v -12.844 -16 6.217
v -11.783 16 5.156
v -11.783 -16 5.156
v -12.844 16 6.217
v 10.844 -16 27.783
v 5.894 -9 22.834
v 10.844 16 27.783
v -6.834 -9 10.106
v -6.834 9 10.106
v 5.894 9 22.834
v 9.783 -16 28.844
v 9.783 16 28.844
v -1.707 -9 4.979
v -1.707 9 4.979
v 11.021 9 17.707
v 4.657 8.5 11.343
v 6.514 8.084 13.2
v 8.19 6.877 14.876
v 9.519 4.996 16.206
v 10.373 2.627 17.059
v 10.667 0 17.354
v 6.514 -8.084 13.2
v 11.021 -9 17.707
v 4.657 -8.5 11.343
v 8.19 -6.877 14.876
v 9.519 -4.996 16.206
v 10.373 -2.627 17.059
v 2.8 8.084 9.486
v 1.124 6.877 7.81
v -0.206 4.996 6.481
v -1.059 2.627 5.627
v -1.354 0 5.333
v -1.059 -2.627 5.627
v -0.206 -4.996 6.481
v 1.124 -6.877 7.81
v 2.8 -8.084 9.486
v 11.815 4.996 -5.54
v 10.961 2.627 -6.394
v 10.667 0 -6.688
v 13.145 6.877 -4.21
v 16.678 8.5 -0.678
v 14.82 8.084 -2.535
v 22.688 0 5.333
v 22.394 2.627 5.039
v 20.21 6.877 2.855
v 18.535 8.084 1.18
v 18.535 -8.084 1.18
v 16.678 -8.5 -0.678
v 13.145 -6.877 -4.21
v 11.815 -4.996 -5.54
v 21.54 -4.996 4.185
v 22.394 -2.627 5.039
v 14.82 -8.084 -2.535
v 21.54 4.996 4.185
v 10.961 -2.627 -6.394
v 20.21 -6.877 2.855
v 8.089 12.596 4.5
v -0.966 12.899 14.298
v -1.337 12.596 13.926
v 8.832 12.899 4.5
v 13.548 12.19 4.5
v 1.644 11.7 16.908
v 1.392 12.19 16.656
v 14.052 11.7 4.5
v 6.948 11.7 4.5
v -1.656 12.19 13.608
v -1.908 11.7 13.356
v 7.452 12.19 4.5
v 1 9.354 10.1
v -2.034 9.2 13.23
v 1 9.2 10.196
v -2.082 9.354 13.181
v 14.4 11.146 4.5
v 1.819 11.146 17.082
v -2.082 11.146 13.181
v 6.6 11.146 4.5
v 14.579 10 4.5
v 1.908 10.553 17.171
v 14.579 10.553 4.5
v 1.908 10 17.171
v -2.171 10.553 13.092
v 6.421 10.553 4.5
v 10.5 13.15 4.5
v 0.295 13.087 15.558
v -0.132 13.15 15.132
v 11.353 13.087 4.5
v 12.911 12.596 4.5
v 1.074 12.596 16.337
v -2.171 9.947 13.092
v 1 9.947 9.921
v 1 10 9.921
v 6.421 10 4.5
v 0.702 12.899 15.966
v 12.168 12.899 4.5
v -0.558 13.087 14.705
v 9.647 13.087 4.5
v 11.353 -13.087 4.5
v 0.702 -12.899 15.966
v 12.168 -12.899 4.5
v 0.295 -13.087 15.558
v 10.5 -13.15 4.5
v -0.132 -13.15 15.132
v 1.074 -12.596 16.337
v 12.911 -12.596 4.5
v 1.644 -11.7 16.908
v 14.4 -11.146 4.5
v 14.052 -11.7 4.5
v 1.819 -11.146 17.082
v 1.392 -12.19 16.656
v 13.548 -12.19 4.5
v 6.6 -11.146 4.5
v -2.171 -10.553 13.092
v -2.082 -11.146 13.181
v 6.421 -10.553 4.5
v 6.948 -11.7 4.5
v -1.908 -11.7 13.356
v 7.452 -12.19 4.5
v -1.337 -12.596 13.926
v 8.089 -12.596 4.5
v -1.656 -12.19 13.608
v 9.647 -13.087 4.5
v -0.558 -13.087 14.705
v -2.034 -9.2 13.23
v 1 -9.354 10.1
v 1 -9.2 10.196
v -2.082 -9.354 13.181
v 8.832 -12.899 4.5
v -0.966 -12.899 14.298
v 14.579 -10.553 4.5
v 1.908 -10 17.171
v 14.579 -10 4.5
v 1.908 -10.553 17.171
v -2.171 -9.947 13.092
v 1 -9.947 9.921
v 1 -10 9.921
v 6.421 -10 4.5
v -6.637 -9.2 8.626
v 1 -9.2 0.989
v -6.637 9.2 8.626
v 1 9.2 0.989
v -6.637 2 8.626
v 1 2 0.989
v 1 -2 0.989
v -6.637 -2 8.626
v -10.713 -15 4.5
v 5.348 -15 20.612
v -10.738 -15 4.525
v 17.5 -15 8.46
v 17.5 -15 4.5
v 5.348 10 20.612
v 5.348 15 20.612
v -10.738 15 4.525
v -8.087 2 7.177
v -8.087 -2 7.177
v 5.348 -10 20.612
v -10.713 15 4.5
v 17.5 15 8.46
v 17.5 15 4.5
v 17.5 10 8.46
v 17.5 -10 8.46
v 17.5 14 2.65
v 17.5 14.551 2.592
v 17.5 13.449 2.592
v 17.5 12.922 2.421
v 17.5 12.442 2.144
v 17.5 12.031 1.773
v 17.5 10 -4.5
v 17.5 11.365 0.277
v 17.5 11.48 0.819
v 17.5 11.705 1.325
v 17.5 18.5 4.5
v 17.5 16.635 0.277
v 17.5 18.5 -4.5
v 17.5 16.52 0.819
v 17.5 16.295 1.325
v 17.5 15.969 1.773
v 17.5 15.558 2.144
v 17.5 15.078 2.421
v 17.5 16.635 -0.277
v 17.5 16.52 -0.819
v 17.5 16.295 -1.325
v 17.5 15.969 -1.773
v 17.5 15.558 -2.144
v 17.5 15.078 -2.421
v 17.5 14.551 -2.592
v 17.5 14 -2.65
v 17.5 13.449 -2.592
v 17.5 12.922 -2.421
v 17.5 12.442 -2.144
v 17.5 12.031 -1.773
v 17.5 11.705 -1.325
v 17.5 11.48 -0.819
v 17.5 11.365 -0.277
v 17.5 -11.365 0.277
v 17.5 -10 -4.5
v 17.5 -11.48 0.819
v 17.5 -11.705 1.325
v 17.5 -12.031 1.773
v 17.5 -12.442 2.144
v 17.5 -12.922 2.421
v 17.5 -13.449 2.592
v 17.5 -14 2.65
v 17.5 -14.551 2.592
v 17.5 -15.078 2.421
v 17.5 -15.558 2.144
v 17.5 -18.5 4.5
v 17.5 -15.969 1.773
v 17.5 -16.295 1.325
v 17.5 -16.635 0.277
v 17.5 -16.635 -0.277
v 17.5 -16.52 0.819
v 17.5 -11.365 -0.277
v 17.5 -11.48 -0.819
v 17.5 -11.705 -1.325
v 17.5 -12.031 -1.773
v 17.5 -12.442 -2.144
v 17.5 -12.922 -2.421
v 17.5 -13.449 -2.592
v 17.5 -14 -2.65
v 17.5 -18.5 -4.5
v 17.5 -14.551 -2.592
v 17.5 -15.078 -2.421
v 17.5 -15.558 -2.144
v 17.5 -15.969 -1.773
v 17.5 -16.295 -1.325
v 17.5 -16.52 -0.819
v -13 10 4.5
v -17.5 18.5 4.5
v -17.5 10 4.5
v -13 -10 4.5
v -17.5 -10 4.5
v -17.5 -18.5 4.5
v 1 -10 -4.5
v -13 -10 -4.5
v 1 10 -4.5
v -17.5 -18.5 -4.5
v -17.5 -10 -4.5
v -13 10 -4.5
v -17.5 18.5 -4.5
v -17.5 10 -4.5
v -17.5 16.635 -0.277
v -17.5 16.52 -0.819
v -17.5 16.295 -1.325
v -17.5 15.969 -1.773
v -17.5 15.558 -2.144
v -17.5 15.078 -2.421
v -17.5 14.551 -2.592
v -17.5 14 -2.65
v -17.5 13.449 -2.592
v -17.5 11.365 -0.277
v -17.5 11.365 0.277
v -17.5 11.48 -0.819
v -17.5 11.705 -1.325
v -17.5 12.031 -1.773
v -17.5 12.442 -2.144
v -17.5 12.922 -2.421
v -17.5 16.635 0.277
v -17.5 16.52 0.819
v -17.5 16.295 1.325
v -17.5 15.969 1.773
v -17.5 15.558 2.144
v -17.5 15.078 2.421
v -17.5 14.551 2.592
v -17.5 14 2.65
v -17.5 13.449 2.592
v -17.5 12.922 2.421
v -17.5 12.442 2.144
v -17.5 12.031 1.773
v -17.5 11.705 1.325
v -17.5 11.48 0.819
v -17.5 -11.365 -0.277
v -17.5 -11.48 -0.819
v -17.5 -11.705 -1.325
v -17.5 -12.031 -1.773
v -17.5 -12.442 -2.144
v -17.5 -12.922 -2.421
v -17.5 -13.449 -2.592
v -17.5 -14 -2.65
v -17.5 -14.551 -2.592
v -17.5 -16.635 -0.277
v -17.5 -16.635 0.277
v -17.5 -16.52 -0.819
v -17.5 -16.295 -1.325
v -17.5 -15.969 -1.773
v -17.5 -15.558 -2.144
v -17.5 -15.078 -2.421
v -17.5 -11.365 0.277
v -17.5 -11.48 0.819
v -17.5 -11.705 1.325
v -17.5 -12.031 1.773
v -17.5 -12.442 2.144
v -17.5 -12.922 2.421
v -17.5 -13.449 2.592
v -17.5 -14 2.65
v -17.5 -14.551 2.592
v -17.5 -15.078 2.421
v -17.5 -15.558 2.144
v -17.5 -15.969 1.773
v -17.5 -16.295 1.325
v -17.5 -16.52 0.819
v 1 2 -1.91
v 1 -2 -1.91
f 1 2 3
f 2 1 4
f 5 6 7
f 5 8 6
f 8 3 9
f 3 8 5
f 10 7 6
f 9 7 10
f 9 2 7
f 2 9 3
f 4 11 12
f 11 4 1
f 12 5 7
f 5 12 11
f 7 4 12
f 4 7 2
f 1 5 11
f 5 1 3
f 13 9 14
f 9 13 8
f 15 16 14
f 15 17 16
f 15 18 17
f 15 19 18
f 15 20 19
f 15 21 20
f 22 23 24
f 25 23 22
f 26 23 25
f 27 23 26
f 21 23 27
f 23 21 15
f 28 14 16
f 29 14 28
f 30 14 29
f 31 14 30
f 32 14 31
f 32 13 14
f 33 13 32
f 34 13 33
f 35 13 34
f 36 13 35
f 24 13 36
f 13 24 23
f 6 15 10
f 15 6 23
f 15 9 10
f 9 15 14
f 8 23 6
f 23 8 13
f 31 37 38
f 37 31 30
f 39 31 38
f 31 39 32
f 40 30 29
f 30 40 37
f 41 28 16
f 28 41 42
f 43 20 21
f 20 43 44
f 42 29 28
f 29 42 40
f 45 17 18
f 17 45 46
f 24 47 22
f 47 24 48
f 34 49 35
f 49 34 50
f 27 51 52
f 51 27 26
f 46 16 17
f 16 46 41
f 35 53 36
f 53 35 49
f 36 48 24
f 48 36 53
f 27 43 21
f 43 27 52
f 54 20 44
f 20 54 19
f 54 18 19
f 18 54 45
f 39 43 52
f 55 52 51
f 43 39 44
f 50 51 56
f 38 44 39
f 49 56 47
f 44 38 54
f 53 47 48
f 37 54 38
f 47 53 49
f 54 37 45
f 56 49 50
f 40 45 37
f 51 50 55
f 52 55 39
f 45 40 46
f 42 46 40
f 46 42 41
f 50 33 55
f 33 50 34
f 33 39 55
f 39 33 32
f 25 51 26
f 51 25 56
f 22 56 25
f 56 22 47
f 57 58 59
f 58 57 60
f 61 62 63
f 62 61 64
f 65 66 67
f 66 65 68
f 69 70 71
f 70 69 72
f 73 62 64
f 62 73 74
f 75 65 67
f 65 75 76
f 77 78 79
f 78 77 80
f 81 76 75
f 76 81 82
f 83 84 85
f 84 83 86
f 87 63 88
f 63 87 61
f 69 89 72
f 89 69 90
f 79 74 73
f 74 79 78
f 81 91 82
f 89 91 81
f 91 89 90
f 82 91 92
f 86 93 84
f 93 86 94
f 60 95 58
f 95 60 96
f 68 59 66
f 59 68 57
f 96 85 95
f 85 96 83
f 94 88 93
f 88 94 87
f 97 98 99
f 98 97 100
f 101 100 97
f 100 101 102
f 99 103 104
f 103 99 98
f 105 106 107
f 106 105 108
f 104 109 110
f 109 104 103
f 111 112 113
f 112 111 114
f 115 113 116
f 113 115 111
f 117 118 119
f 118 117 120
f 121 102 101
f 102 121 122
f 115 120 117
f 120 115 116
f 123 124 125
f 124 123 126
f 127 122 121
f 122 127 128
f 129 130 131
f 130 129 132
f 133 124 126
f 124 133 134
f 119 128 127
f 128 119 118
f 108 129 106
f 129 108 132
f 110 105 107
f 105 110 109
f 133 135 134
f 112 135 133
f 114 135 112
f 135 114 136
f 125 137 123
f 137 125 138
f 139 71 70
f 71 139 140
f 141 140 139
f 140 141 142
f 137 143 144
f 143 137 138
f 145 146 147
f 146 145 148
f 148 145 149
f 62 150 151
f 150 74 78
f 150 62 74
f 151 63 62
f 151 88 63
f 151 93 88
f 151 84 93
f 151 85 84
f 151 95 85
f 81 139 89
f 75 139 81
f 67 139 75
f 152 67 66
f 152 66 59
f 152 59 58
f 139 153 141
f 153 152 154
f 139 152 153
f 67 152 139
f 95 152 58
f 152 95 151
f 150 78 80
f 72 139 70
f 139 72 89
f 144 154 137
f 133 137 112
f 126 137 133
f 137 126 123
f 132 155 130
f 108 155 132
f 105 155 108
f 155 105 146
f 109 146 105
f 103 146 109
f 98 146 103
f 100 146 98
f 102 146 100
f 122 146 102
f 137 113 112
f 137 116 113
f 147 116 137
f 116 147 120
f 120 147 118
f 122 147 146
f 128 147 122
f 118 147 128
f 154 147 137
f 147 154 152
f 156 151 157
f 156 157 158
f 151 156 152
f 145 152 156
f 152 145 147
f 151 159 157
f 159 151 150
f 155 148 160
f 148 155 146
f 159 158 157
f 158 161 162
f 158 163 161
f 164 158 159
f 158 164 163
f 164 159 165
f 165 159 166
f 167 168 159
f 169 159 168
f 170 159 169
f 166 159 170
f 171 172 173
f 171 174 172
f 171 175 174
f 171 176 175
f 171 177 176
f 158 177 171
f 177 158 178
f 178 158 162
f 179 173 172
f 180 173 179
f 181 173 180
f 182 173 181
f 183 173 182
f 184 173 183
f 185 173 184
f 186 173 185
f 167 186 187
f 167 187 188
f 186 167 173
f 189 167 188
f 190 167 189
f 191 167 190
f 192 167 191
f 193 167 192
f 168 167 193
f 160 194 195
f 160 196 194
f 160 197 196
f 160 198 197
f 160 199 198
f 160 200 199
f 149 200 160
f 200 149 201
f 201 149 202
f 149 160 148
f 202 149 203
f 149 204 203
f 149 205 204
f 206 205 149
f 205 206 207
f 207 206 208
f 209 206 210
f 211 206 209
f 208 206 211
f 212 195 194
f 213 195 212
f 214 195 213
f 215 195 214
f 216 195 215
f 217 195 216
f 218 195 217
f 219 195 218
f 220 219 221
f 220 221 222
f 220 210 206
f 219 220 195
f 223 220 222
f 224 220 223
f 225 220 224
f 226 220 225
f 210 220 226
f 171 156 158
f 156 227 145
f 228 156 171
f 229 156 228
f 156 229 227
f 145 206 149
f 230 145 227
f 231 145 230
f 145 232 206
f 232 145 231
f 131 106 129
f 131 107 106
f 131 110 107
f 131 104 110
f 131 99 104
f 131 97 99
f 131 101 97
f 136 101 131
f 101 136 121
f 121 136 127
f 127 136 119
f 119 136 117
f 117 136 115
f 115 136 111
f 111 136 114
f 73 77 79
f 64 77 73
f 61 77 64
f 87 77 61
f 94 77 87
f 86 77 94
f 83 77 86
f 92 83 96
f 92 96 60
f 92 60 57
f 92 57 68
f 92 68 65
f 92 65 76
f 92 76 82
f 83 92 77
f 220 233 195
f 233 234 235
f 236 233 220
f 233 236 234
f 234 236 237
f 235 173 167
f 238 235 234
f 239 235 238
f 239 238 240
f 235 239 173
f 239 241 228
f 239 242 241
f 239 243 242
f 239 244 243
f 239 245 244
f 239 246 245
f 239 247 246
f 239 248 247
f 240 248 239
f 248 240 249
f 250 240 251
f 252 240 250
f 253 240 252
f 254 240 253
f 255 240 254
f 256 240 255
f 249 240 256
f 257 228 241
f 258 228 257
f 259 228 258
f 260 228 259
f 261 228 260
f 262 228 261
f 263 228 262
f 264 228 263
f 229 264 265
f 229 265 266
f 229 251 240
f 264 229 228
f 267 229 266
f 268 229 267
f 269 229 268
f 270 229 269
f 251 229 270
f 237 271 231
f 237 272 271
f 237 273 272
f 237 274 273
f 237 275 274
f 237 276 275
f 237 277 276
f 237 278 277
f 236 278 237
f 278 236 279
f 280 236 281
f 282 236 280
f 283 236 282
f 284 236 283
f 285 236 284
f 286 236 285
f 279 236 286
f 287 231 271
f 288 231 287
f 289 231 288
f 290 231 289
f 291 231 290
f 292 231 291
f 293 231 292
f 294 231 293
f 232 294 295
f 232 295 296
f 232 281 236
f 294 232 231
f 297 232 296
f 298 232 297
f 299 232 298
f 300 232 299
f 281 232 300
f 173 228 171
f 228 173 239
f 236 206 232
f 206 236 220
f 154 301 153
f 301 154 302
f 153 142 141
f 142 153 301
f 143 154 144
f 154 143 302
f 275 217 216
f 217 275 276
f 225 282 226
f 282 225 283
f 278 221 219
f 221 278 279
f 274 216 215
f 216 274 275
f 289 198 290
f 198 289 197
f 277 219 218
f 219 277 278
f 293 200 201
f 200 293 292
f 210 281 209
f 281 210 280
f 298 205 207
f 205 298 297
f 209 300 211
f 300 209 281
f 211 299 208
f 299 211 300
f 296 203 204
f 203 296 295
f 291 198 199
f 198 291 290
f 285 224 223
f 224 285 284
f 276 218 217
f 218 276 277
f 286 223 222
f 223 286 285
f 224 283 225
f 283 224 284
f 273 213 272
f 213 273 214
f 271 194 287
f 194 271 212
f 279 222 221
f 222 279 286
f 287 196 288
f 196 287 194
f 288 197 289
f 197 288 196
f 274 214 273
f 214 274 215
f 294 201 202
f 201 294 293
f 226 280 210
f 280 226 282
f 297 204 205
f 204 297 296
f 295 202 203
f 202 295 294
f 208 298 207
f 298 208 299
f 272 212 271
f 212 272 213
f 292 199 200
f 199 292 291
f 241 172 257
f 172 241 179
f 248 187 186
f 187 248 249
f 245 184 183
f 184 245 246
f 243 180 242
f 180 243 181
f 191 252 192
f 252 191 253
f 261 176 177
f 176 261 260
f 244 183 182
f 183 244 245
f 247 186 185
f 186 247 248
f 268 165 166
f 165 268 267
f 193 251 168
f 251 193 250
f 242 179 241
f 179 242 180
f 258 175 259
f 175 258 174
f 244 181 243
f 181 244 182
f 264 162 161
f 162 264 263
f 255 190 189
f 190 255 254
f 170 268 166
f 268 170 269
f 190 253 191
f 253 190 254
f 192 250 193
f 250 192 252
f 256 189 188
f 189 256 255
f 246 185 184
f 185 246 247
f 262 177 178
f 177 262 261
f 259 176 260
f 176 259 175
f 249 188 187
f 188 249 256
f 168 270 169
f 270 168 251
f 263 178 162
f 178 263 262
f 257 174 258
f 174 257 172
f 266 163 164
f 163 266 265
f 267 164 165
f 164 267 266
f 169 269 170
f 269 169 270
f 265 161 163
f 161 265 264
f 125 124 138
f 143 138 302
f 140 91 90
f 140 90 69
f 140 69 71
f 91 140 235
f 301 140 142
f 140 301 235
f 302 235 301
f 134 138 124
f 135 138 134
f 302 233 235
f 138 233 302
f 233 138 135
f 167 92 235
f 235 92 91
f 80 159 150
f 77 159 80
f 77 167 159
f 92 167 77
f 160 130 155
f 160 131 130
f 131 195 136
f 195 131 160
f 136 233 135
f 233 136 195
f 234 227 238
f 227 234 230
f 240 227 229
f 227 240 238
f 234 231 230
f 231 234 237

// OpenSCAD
// file: dronePlates.scad
/**
 * dronePlates.scad
 * Plate library
 *
 * GNU GPL V3
 * @author: Victor Potenciano
 */

m3Rad = 3.4/2;
cornerR = 4;

/**
 *
 */
module helperDisk(diameter) {
	cylinder(r = diameter/2, h = 0.6, $fn=20);
}

/**
 *
 */
module roundedRect(size, radius) {
	x = size[0];
	y = size[1];
	z = size[2];

	linear_extrude(height=z)
	hull() {
	// place 4 circles in the corners, with the given radius
	translate([(-x/2)+(radius/2), (-y/2)+(radius/2), 0]){ circle(r=radius); }
	translate([(x/2)-(radius/2), (-y/2)+(radius/2), 0]){ circle(r=radius); }
	translate([(-x/2)+(radius/2), (y/2)-(radius/2), 0]){ circle(r=radius); }
	translate([(x/2)-(radius/2), (y/2)-(radius/2), 0]){ circle(r=radius); }
	}
}

/**
 * rounded rectangle triangle with corner at origin
 */
module roundedTriangle(size, radius) {
	x = size[0];
	y = size[1];
	z = size[2];

	linear_extrude(height=z)
	hull() {
	translate([radius, radius, 0]){ circle(r=radius); }
	translate([x-radius, radius, 0]){ circle(r=radius); }
	translate([radius, y-radius, 0]){ circle(r=radius); }
	}
}

/**
 *
 */
module roundRectPlate(w, l, plateThick=3) {
	difference(){
		roundedRect([l+m3Rad*1.75,w+m3Rad*1.75,plateThick], cornerR);
		translate([l/2, w/2, -0.5]) { cylinder(h = plateThick+1, r = m3Rad, $fn=30); }
		translate([-l/2, w/2, -0.5]) { cylinder(h = plateThick+1, r = m3Rad, $fn=30); }
		translate([l/2, -w/2, -0.5]) { cylinder(h = plateThick+1, r = m3Rad, $fn=30); }
		translate([-l/2, -w/2, -0.5]) { cylinder(h = plateThick+1, r = m3Rad, $fn=30); }
	}
}

/**
 *
 */
module crossSquarePlate(l, thick=3) {
	inDist = cornerR*2+4;
	trianL = sqrt((l*l)/2)-inDist;
	centerR = 4;

	difference(){
		roundRectPlate(l, l, thick);
		translate([0, centerR, -0.5]) { 
			rotate([0,0,45]){ roundedTriangle([trianL,trianL,thick+1], cornerR-2); }
		}
		translate([0, -centerR, -0.5]) { 
			rotate([0,0,225]){ roundedTriangle([trianL,trianL,thick+1], cornerR-2); }
		}
		translate([-centerR, 0, -0.5]) { 
			rotate([0,0,135]){ roundedTriangle([trianL,trianL,thick+1], cornerR-2); }
		}
		translate([centerR, 0, -0.5]) { 
			rotate([0,0,-45]){ roundedTriangle([trianL,trianL,thick+1], cornerR-2); }
		}
	}
}

/**
 *
 */
module hShapePlate(w, l, thick=4) {
	inDist = cornerR*2+1;

	difference(){
		roundRectPlate(w, l, thick);
		translate([0, w/4, -0.5]) { roundedRect([l-inDist,w/2-inDist,thick+1], cornerR-2); }
		translate([0, -w/4, -0.5]) { roundedRect([l-inDist,w/2-inDist,thick+1], cornerR-2); }
	}
}

/**
 *
 */
module motorCircleMount(inDia, outDia, thick=3, extraH=false, d1=19, d2=16, holeR=m3Rad ) {
	difference(){
		cylinder(h = thick, r = outDia/2, $fn=30);
		motorCircleMountHoles(inDia, outDia, thick, extraH, d1=d1, d2=d2, holeR=holeR);
	}
}

/**
 *
 */
module motorCircleMountHoles(inDia, outDia, thick=3, extraH=false, d1=19, d2=16, d3=25, holeR=m3Rad) {
	translate([0, 0, -0.5]) { cylinder(h = thick+1, r = inDia/2, $fn=30); }

	for(i=[0:3]) {
		rotate([0,0,90*i]){
		translate([d1/2, 0, -0.5]) cylinder(h = thick+1, r = holeR, $fn=20);
		translate([d2/2, 0, -0.5]) cylinder(h = thick+1, r = holeR, $fn=20);
		translate([d2/2, -holeR, -0.5]) cube(size = [(d1-d2)/2,holeR*2,thick+1]);
		}
	}
	
	if(extraH==true){	
		for(i=[-1,1]) translate([i*d3/2, 0, -0.5]) { cylinder(h = thick+1, r = holeR, $fn=30); }
	}
}

/**
 *
 */
module motorRectMount(w, l, inDia, thick=3) {
	d1=19;
	d2=16;

	difference(){
		roundRectPlate(w, l, thick);
		translate([0, 0, -0.5]) { cylinder(h = thick+1, r = inDia/2, $fn=30); }
		translate([0, d1/2, -0.5]) { cylinder(h = thick+1, r = m3Rad, $fn=30); }
		translate([0, -d1/2, -0.5]) { cylinder(h = thick+1, r = m3Rad, $fn=30); }
		translate([d2/2, 0, -0.5]) { cylinder(h = thick+1, r = m3Rad, $fn=30); }
		translate([-d2/2, 0, -0.5]) { cylinder(h = thick+1, r = m3Rad, $fn=30); }
	}
}

/**
 *
 */
module tube(inDia, outDia, height) {
	difference(){
		cylinder(h = height, r = outDia/2, $fn=50);
		translate([0, 0, -0.5]) { cylinder(h = height+1, r = inDia/2, $fn=30); }
	}
}

/**
 *
 */
module squareTube(inDia, outDia, height) {
	translate([0,0,height/2]){
	difference(){
		cube(size = [outDia,outDia,height], center = true);
		cube(size = [inDia,inDia,height+1], center = true);
	}
	}
}

/**
 *
 */
module djiFlamewheelHoles(height) {
	a = 23;
	b = 16;
	c = 19.5;
	
	translate([a/2, c/2, 0]) { cylinder(h = height, r = m3Rad, $fn=30); }
	translate([-a/2, c/2, 0]) { cylinder(h = height, r = m3Rad, $fn=30); }
	translate([b/2, -c/2, 0]) { cylinder(h = height, r = m3Rad, $fn=30); }
	translate([-b/2, -c/2, 0]) { cylinder(h = height, r = m3Rad, $fn=30); }
}

/**
 *
 */
module djiFlamewheelHolesBotton(height) {
	a1 = 21;
	c = 19.5;
	
	translate([a1/2, c/2, 0]) { cylinder(h = height, r = m3Rad, $fn=30); }
	translate([-a1/2, c/2, 0]) { cylinder(h = height, r = m3Rad, $fn=30); }
}

/**
 *
 */
module propeller(size){
union(){
difference(){
	cylinder(h = 3, r = size/2, center=true, $fn=30);
	cylinder(h = 3.1, r = size/2-2, center=true, $fn=30); 
}
for( i = [-1,1] ){
rotate([0,0,45*i]){ cube(size = [size,4,1], center = true); }
}
}
}

/**
 *
 */
module slot(length, height, rad){
for(i=[-1,1]) translate([i*length/2,0,0]) cylinder(h = height, r = rad, $fn=30);
translate([0,0,height/2]) cube(size = [length,rad*2,height], center = true);
}

 

////////////////////////
// Examples:
////////////////////////

motorCircleMount(8, 25, 3.5);

//roundedRect([50,50,3], 4);

//hShapePlate(79, 25);

//rotate([0,0,45]){roundedTriangle([40,40,3], 4);}

//crossSquarePlate(45, 4);

/*
union(){
motorRectMount(21, 18, 8, 4);
translate([9, 10.5, 0]) {tube(m3Rad*2, 6.5, 6);}
}
*/

/*
difference(){
union(){
hShapePlate(50, 30, 3.5);
translate([-4,-25,0]){cube(size = [8,50,3.5]);}
rotate([0, 0, 45]) {motorCircleMount(8, 35, 3.5);}
}
cylinder(h = 10, r = 4, $fn=100, center=true);
}
*/

//rotate([90,0,0]){ tube(5,10,20); }
//translate([20,0,0]){ squareTube(5, 10, 20); }
// main file
/**
 * lt210 fpv camera mount
 */
 
use <dronePlates.scad>;

thick = 1.5;
hubSqH=25;
tolerance=0.4;
front_cc = 28;
angle=45;

/**
 *
 */
module cameraHub(tolerance=0){
sqL = 18;

translate([0,0,hubSqH/2]) cube(size=[sqL+tolerance,sqL+tolerance,hubSqH+tolerance], center=true);
cylinder(r=7.5+(tolerance/2), h=16, $fn=20);
for(i=[-1,1]) translate([i*10.25,0,0]) cylinder(h=hubSqH,r=2.7+(tolerance/2),$fn=30);
translate([0,0,16/2])cube(size=[3+tolerance,sqL+4+tolerance,16], center=true);
}//end module

/**
 *
 */
module housing(){
difference(){
cube(size=[30,30,hubSqH-2], center=true);
scale([1,1,1.1]) translate([0,0,-hubSqH/2]) cameraHub(tolerance=tolerance);
translate([0,13,0]) cube(size=[32+1,10+0.5,hubSqH], center=true);
}
}//end module

/**
 *
 */
module fpvCam(){
    union(){
    cube([32,32,1.5], center=true);
    translate([0,0,4]) cube([18,18,8], center=true);
    cylinder(r=8.5, h=25, $fn=20);
    }
}

shiftZ= 7;
shiftX=8;
preShZ = 0;
color("grey") translate([-1,0,17]) rotate([0,180-angle,0]) fpvCam();

color(alpha=0.4)
difference(){
    union(){
        cube([35,37,9], center=true);
        translate([shiftX,0,shiftZ])  rotate([0,-angle,0]) translate([0,0,-preShZ]) rotate([0,0,-90]) housing();
    }
    
    translate([shiftX,0,shiftZ]) rotate([0,-angle,0]) {
    translate([0,0,preShZ]) rotate([0,0,-90]) cameraHub(tolerance=tolerance);
    cylinder(r=8.2, h=60, center=true, $fn=30);
    translate([-9.25,0,0]) cube(size=[4,4,60], center=true);
    }
    
    for(i=[-1,1]){
        translate([0,i*front_cc/2,0]) rotate([0,90,0]) 
            cylinder(r=5.3/2, h=100, $fn=30, center=true);
    }
    
    translate([10,0,0]) cube(size=[18,20,50], center=true);
    translate([35/2+10/2,0,0]) cube(size=[10,40,50], center=true);
    translate([0,0,-9.5]) cube(size=[40,40,10], center=true);
    translate([-18,0,0]) cube(size=[10,20,50], center=true);
}
